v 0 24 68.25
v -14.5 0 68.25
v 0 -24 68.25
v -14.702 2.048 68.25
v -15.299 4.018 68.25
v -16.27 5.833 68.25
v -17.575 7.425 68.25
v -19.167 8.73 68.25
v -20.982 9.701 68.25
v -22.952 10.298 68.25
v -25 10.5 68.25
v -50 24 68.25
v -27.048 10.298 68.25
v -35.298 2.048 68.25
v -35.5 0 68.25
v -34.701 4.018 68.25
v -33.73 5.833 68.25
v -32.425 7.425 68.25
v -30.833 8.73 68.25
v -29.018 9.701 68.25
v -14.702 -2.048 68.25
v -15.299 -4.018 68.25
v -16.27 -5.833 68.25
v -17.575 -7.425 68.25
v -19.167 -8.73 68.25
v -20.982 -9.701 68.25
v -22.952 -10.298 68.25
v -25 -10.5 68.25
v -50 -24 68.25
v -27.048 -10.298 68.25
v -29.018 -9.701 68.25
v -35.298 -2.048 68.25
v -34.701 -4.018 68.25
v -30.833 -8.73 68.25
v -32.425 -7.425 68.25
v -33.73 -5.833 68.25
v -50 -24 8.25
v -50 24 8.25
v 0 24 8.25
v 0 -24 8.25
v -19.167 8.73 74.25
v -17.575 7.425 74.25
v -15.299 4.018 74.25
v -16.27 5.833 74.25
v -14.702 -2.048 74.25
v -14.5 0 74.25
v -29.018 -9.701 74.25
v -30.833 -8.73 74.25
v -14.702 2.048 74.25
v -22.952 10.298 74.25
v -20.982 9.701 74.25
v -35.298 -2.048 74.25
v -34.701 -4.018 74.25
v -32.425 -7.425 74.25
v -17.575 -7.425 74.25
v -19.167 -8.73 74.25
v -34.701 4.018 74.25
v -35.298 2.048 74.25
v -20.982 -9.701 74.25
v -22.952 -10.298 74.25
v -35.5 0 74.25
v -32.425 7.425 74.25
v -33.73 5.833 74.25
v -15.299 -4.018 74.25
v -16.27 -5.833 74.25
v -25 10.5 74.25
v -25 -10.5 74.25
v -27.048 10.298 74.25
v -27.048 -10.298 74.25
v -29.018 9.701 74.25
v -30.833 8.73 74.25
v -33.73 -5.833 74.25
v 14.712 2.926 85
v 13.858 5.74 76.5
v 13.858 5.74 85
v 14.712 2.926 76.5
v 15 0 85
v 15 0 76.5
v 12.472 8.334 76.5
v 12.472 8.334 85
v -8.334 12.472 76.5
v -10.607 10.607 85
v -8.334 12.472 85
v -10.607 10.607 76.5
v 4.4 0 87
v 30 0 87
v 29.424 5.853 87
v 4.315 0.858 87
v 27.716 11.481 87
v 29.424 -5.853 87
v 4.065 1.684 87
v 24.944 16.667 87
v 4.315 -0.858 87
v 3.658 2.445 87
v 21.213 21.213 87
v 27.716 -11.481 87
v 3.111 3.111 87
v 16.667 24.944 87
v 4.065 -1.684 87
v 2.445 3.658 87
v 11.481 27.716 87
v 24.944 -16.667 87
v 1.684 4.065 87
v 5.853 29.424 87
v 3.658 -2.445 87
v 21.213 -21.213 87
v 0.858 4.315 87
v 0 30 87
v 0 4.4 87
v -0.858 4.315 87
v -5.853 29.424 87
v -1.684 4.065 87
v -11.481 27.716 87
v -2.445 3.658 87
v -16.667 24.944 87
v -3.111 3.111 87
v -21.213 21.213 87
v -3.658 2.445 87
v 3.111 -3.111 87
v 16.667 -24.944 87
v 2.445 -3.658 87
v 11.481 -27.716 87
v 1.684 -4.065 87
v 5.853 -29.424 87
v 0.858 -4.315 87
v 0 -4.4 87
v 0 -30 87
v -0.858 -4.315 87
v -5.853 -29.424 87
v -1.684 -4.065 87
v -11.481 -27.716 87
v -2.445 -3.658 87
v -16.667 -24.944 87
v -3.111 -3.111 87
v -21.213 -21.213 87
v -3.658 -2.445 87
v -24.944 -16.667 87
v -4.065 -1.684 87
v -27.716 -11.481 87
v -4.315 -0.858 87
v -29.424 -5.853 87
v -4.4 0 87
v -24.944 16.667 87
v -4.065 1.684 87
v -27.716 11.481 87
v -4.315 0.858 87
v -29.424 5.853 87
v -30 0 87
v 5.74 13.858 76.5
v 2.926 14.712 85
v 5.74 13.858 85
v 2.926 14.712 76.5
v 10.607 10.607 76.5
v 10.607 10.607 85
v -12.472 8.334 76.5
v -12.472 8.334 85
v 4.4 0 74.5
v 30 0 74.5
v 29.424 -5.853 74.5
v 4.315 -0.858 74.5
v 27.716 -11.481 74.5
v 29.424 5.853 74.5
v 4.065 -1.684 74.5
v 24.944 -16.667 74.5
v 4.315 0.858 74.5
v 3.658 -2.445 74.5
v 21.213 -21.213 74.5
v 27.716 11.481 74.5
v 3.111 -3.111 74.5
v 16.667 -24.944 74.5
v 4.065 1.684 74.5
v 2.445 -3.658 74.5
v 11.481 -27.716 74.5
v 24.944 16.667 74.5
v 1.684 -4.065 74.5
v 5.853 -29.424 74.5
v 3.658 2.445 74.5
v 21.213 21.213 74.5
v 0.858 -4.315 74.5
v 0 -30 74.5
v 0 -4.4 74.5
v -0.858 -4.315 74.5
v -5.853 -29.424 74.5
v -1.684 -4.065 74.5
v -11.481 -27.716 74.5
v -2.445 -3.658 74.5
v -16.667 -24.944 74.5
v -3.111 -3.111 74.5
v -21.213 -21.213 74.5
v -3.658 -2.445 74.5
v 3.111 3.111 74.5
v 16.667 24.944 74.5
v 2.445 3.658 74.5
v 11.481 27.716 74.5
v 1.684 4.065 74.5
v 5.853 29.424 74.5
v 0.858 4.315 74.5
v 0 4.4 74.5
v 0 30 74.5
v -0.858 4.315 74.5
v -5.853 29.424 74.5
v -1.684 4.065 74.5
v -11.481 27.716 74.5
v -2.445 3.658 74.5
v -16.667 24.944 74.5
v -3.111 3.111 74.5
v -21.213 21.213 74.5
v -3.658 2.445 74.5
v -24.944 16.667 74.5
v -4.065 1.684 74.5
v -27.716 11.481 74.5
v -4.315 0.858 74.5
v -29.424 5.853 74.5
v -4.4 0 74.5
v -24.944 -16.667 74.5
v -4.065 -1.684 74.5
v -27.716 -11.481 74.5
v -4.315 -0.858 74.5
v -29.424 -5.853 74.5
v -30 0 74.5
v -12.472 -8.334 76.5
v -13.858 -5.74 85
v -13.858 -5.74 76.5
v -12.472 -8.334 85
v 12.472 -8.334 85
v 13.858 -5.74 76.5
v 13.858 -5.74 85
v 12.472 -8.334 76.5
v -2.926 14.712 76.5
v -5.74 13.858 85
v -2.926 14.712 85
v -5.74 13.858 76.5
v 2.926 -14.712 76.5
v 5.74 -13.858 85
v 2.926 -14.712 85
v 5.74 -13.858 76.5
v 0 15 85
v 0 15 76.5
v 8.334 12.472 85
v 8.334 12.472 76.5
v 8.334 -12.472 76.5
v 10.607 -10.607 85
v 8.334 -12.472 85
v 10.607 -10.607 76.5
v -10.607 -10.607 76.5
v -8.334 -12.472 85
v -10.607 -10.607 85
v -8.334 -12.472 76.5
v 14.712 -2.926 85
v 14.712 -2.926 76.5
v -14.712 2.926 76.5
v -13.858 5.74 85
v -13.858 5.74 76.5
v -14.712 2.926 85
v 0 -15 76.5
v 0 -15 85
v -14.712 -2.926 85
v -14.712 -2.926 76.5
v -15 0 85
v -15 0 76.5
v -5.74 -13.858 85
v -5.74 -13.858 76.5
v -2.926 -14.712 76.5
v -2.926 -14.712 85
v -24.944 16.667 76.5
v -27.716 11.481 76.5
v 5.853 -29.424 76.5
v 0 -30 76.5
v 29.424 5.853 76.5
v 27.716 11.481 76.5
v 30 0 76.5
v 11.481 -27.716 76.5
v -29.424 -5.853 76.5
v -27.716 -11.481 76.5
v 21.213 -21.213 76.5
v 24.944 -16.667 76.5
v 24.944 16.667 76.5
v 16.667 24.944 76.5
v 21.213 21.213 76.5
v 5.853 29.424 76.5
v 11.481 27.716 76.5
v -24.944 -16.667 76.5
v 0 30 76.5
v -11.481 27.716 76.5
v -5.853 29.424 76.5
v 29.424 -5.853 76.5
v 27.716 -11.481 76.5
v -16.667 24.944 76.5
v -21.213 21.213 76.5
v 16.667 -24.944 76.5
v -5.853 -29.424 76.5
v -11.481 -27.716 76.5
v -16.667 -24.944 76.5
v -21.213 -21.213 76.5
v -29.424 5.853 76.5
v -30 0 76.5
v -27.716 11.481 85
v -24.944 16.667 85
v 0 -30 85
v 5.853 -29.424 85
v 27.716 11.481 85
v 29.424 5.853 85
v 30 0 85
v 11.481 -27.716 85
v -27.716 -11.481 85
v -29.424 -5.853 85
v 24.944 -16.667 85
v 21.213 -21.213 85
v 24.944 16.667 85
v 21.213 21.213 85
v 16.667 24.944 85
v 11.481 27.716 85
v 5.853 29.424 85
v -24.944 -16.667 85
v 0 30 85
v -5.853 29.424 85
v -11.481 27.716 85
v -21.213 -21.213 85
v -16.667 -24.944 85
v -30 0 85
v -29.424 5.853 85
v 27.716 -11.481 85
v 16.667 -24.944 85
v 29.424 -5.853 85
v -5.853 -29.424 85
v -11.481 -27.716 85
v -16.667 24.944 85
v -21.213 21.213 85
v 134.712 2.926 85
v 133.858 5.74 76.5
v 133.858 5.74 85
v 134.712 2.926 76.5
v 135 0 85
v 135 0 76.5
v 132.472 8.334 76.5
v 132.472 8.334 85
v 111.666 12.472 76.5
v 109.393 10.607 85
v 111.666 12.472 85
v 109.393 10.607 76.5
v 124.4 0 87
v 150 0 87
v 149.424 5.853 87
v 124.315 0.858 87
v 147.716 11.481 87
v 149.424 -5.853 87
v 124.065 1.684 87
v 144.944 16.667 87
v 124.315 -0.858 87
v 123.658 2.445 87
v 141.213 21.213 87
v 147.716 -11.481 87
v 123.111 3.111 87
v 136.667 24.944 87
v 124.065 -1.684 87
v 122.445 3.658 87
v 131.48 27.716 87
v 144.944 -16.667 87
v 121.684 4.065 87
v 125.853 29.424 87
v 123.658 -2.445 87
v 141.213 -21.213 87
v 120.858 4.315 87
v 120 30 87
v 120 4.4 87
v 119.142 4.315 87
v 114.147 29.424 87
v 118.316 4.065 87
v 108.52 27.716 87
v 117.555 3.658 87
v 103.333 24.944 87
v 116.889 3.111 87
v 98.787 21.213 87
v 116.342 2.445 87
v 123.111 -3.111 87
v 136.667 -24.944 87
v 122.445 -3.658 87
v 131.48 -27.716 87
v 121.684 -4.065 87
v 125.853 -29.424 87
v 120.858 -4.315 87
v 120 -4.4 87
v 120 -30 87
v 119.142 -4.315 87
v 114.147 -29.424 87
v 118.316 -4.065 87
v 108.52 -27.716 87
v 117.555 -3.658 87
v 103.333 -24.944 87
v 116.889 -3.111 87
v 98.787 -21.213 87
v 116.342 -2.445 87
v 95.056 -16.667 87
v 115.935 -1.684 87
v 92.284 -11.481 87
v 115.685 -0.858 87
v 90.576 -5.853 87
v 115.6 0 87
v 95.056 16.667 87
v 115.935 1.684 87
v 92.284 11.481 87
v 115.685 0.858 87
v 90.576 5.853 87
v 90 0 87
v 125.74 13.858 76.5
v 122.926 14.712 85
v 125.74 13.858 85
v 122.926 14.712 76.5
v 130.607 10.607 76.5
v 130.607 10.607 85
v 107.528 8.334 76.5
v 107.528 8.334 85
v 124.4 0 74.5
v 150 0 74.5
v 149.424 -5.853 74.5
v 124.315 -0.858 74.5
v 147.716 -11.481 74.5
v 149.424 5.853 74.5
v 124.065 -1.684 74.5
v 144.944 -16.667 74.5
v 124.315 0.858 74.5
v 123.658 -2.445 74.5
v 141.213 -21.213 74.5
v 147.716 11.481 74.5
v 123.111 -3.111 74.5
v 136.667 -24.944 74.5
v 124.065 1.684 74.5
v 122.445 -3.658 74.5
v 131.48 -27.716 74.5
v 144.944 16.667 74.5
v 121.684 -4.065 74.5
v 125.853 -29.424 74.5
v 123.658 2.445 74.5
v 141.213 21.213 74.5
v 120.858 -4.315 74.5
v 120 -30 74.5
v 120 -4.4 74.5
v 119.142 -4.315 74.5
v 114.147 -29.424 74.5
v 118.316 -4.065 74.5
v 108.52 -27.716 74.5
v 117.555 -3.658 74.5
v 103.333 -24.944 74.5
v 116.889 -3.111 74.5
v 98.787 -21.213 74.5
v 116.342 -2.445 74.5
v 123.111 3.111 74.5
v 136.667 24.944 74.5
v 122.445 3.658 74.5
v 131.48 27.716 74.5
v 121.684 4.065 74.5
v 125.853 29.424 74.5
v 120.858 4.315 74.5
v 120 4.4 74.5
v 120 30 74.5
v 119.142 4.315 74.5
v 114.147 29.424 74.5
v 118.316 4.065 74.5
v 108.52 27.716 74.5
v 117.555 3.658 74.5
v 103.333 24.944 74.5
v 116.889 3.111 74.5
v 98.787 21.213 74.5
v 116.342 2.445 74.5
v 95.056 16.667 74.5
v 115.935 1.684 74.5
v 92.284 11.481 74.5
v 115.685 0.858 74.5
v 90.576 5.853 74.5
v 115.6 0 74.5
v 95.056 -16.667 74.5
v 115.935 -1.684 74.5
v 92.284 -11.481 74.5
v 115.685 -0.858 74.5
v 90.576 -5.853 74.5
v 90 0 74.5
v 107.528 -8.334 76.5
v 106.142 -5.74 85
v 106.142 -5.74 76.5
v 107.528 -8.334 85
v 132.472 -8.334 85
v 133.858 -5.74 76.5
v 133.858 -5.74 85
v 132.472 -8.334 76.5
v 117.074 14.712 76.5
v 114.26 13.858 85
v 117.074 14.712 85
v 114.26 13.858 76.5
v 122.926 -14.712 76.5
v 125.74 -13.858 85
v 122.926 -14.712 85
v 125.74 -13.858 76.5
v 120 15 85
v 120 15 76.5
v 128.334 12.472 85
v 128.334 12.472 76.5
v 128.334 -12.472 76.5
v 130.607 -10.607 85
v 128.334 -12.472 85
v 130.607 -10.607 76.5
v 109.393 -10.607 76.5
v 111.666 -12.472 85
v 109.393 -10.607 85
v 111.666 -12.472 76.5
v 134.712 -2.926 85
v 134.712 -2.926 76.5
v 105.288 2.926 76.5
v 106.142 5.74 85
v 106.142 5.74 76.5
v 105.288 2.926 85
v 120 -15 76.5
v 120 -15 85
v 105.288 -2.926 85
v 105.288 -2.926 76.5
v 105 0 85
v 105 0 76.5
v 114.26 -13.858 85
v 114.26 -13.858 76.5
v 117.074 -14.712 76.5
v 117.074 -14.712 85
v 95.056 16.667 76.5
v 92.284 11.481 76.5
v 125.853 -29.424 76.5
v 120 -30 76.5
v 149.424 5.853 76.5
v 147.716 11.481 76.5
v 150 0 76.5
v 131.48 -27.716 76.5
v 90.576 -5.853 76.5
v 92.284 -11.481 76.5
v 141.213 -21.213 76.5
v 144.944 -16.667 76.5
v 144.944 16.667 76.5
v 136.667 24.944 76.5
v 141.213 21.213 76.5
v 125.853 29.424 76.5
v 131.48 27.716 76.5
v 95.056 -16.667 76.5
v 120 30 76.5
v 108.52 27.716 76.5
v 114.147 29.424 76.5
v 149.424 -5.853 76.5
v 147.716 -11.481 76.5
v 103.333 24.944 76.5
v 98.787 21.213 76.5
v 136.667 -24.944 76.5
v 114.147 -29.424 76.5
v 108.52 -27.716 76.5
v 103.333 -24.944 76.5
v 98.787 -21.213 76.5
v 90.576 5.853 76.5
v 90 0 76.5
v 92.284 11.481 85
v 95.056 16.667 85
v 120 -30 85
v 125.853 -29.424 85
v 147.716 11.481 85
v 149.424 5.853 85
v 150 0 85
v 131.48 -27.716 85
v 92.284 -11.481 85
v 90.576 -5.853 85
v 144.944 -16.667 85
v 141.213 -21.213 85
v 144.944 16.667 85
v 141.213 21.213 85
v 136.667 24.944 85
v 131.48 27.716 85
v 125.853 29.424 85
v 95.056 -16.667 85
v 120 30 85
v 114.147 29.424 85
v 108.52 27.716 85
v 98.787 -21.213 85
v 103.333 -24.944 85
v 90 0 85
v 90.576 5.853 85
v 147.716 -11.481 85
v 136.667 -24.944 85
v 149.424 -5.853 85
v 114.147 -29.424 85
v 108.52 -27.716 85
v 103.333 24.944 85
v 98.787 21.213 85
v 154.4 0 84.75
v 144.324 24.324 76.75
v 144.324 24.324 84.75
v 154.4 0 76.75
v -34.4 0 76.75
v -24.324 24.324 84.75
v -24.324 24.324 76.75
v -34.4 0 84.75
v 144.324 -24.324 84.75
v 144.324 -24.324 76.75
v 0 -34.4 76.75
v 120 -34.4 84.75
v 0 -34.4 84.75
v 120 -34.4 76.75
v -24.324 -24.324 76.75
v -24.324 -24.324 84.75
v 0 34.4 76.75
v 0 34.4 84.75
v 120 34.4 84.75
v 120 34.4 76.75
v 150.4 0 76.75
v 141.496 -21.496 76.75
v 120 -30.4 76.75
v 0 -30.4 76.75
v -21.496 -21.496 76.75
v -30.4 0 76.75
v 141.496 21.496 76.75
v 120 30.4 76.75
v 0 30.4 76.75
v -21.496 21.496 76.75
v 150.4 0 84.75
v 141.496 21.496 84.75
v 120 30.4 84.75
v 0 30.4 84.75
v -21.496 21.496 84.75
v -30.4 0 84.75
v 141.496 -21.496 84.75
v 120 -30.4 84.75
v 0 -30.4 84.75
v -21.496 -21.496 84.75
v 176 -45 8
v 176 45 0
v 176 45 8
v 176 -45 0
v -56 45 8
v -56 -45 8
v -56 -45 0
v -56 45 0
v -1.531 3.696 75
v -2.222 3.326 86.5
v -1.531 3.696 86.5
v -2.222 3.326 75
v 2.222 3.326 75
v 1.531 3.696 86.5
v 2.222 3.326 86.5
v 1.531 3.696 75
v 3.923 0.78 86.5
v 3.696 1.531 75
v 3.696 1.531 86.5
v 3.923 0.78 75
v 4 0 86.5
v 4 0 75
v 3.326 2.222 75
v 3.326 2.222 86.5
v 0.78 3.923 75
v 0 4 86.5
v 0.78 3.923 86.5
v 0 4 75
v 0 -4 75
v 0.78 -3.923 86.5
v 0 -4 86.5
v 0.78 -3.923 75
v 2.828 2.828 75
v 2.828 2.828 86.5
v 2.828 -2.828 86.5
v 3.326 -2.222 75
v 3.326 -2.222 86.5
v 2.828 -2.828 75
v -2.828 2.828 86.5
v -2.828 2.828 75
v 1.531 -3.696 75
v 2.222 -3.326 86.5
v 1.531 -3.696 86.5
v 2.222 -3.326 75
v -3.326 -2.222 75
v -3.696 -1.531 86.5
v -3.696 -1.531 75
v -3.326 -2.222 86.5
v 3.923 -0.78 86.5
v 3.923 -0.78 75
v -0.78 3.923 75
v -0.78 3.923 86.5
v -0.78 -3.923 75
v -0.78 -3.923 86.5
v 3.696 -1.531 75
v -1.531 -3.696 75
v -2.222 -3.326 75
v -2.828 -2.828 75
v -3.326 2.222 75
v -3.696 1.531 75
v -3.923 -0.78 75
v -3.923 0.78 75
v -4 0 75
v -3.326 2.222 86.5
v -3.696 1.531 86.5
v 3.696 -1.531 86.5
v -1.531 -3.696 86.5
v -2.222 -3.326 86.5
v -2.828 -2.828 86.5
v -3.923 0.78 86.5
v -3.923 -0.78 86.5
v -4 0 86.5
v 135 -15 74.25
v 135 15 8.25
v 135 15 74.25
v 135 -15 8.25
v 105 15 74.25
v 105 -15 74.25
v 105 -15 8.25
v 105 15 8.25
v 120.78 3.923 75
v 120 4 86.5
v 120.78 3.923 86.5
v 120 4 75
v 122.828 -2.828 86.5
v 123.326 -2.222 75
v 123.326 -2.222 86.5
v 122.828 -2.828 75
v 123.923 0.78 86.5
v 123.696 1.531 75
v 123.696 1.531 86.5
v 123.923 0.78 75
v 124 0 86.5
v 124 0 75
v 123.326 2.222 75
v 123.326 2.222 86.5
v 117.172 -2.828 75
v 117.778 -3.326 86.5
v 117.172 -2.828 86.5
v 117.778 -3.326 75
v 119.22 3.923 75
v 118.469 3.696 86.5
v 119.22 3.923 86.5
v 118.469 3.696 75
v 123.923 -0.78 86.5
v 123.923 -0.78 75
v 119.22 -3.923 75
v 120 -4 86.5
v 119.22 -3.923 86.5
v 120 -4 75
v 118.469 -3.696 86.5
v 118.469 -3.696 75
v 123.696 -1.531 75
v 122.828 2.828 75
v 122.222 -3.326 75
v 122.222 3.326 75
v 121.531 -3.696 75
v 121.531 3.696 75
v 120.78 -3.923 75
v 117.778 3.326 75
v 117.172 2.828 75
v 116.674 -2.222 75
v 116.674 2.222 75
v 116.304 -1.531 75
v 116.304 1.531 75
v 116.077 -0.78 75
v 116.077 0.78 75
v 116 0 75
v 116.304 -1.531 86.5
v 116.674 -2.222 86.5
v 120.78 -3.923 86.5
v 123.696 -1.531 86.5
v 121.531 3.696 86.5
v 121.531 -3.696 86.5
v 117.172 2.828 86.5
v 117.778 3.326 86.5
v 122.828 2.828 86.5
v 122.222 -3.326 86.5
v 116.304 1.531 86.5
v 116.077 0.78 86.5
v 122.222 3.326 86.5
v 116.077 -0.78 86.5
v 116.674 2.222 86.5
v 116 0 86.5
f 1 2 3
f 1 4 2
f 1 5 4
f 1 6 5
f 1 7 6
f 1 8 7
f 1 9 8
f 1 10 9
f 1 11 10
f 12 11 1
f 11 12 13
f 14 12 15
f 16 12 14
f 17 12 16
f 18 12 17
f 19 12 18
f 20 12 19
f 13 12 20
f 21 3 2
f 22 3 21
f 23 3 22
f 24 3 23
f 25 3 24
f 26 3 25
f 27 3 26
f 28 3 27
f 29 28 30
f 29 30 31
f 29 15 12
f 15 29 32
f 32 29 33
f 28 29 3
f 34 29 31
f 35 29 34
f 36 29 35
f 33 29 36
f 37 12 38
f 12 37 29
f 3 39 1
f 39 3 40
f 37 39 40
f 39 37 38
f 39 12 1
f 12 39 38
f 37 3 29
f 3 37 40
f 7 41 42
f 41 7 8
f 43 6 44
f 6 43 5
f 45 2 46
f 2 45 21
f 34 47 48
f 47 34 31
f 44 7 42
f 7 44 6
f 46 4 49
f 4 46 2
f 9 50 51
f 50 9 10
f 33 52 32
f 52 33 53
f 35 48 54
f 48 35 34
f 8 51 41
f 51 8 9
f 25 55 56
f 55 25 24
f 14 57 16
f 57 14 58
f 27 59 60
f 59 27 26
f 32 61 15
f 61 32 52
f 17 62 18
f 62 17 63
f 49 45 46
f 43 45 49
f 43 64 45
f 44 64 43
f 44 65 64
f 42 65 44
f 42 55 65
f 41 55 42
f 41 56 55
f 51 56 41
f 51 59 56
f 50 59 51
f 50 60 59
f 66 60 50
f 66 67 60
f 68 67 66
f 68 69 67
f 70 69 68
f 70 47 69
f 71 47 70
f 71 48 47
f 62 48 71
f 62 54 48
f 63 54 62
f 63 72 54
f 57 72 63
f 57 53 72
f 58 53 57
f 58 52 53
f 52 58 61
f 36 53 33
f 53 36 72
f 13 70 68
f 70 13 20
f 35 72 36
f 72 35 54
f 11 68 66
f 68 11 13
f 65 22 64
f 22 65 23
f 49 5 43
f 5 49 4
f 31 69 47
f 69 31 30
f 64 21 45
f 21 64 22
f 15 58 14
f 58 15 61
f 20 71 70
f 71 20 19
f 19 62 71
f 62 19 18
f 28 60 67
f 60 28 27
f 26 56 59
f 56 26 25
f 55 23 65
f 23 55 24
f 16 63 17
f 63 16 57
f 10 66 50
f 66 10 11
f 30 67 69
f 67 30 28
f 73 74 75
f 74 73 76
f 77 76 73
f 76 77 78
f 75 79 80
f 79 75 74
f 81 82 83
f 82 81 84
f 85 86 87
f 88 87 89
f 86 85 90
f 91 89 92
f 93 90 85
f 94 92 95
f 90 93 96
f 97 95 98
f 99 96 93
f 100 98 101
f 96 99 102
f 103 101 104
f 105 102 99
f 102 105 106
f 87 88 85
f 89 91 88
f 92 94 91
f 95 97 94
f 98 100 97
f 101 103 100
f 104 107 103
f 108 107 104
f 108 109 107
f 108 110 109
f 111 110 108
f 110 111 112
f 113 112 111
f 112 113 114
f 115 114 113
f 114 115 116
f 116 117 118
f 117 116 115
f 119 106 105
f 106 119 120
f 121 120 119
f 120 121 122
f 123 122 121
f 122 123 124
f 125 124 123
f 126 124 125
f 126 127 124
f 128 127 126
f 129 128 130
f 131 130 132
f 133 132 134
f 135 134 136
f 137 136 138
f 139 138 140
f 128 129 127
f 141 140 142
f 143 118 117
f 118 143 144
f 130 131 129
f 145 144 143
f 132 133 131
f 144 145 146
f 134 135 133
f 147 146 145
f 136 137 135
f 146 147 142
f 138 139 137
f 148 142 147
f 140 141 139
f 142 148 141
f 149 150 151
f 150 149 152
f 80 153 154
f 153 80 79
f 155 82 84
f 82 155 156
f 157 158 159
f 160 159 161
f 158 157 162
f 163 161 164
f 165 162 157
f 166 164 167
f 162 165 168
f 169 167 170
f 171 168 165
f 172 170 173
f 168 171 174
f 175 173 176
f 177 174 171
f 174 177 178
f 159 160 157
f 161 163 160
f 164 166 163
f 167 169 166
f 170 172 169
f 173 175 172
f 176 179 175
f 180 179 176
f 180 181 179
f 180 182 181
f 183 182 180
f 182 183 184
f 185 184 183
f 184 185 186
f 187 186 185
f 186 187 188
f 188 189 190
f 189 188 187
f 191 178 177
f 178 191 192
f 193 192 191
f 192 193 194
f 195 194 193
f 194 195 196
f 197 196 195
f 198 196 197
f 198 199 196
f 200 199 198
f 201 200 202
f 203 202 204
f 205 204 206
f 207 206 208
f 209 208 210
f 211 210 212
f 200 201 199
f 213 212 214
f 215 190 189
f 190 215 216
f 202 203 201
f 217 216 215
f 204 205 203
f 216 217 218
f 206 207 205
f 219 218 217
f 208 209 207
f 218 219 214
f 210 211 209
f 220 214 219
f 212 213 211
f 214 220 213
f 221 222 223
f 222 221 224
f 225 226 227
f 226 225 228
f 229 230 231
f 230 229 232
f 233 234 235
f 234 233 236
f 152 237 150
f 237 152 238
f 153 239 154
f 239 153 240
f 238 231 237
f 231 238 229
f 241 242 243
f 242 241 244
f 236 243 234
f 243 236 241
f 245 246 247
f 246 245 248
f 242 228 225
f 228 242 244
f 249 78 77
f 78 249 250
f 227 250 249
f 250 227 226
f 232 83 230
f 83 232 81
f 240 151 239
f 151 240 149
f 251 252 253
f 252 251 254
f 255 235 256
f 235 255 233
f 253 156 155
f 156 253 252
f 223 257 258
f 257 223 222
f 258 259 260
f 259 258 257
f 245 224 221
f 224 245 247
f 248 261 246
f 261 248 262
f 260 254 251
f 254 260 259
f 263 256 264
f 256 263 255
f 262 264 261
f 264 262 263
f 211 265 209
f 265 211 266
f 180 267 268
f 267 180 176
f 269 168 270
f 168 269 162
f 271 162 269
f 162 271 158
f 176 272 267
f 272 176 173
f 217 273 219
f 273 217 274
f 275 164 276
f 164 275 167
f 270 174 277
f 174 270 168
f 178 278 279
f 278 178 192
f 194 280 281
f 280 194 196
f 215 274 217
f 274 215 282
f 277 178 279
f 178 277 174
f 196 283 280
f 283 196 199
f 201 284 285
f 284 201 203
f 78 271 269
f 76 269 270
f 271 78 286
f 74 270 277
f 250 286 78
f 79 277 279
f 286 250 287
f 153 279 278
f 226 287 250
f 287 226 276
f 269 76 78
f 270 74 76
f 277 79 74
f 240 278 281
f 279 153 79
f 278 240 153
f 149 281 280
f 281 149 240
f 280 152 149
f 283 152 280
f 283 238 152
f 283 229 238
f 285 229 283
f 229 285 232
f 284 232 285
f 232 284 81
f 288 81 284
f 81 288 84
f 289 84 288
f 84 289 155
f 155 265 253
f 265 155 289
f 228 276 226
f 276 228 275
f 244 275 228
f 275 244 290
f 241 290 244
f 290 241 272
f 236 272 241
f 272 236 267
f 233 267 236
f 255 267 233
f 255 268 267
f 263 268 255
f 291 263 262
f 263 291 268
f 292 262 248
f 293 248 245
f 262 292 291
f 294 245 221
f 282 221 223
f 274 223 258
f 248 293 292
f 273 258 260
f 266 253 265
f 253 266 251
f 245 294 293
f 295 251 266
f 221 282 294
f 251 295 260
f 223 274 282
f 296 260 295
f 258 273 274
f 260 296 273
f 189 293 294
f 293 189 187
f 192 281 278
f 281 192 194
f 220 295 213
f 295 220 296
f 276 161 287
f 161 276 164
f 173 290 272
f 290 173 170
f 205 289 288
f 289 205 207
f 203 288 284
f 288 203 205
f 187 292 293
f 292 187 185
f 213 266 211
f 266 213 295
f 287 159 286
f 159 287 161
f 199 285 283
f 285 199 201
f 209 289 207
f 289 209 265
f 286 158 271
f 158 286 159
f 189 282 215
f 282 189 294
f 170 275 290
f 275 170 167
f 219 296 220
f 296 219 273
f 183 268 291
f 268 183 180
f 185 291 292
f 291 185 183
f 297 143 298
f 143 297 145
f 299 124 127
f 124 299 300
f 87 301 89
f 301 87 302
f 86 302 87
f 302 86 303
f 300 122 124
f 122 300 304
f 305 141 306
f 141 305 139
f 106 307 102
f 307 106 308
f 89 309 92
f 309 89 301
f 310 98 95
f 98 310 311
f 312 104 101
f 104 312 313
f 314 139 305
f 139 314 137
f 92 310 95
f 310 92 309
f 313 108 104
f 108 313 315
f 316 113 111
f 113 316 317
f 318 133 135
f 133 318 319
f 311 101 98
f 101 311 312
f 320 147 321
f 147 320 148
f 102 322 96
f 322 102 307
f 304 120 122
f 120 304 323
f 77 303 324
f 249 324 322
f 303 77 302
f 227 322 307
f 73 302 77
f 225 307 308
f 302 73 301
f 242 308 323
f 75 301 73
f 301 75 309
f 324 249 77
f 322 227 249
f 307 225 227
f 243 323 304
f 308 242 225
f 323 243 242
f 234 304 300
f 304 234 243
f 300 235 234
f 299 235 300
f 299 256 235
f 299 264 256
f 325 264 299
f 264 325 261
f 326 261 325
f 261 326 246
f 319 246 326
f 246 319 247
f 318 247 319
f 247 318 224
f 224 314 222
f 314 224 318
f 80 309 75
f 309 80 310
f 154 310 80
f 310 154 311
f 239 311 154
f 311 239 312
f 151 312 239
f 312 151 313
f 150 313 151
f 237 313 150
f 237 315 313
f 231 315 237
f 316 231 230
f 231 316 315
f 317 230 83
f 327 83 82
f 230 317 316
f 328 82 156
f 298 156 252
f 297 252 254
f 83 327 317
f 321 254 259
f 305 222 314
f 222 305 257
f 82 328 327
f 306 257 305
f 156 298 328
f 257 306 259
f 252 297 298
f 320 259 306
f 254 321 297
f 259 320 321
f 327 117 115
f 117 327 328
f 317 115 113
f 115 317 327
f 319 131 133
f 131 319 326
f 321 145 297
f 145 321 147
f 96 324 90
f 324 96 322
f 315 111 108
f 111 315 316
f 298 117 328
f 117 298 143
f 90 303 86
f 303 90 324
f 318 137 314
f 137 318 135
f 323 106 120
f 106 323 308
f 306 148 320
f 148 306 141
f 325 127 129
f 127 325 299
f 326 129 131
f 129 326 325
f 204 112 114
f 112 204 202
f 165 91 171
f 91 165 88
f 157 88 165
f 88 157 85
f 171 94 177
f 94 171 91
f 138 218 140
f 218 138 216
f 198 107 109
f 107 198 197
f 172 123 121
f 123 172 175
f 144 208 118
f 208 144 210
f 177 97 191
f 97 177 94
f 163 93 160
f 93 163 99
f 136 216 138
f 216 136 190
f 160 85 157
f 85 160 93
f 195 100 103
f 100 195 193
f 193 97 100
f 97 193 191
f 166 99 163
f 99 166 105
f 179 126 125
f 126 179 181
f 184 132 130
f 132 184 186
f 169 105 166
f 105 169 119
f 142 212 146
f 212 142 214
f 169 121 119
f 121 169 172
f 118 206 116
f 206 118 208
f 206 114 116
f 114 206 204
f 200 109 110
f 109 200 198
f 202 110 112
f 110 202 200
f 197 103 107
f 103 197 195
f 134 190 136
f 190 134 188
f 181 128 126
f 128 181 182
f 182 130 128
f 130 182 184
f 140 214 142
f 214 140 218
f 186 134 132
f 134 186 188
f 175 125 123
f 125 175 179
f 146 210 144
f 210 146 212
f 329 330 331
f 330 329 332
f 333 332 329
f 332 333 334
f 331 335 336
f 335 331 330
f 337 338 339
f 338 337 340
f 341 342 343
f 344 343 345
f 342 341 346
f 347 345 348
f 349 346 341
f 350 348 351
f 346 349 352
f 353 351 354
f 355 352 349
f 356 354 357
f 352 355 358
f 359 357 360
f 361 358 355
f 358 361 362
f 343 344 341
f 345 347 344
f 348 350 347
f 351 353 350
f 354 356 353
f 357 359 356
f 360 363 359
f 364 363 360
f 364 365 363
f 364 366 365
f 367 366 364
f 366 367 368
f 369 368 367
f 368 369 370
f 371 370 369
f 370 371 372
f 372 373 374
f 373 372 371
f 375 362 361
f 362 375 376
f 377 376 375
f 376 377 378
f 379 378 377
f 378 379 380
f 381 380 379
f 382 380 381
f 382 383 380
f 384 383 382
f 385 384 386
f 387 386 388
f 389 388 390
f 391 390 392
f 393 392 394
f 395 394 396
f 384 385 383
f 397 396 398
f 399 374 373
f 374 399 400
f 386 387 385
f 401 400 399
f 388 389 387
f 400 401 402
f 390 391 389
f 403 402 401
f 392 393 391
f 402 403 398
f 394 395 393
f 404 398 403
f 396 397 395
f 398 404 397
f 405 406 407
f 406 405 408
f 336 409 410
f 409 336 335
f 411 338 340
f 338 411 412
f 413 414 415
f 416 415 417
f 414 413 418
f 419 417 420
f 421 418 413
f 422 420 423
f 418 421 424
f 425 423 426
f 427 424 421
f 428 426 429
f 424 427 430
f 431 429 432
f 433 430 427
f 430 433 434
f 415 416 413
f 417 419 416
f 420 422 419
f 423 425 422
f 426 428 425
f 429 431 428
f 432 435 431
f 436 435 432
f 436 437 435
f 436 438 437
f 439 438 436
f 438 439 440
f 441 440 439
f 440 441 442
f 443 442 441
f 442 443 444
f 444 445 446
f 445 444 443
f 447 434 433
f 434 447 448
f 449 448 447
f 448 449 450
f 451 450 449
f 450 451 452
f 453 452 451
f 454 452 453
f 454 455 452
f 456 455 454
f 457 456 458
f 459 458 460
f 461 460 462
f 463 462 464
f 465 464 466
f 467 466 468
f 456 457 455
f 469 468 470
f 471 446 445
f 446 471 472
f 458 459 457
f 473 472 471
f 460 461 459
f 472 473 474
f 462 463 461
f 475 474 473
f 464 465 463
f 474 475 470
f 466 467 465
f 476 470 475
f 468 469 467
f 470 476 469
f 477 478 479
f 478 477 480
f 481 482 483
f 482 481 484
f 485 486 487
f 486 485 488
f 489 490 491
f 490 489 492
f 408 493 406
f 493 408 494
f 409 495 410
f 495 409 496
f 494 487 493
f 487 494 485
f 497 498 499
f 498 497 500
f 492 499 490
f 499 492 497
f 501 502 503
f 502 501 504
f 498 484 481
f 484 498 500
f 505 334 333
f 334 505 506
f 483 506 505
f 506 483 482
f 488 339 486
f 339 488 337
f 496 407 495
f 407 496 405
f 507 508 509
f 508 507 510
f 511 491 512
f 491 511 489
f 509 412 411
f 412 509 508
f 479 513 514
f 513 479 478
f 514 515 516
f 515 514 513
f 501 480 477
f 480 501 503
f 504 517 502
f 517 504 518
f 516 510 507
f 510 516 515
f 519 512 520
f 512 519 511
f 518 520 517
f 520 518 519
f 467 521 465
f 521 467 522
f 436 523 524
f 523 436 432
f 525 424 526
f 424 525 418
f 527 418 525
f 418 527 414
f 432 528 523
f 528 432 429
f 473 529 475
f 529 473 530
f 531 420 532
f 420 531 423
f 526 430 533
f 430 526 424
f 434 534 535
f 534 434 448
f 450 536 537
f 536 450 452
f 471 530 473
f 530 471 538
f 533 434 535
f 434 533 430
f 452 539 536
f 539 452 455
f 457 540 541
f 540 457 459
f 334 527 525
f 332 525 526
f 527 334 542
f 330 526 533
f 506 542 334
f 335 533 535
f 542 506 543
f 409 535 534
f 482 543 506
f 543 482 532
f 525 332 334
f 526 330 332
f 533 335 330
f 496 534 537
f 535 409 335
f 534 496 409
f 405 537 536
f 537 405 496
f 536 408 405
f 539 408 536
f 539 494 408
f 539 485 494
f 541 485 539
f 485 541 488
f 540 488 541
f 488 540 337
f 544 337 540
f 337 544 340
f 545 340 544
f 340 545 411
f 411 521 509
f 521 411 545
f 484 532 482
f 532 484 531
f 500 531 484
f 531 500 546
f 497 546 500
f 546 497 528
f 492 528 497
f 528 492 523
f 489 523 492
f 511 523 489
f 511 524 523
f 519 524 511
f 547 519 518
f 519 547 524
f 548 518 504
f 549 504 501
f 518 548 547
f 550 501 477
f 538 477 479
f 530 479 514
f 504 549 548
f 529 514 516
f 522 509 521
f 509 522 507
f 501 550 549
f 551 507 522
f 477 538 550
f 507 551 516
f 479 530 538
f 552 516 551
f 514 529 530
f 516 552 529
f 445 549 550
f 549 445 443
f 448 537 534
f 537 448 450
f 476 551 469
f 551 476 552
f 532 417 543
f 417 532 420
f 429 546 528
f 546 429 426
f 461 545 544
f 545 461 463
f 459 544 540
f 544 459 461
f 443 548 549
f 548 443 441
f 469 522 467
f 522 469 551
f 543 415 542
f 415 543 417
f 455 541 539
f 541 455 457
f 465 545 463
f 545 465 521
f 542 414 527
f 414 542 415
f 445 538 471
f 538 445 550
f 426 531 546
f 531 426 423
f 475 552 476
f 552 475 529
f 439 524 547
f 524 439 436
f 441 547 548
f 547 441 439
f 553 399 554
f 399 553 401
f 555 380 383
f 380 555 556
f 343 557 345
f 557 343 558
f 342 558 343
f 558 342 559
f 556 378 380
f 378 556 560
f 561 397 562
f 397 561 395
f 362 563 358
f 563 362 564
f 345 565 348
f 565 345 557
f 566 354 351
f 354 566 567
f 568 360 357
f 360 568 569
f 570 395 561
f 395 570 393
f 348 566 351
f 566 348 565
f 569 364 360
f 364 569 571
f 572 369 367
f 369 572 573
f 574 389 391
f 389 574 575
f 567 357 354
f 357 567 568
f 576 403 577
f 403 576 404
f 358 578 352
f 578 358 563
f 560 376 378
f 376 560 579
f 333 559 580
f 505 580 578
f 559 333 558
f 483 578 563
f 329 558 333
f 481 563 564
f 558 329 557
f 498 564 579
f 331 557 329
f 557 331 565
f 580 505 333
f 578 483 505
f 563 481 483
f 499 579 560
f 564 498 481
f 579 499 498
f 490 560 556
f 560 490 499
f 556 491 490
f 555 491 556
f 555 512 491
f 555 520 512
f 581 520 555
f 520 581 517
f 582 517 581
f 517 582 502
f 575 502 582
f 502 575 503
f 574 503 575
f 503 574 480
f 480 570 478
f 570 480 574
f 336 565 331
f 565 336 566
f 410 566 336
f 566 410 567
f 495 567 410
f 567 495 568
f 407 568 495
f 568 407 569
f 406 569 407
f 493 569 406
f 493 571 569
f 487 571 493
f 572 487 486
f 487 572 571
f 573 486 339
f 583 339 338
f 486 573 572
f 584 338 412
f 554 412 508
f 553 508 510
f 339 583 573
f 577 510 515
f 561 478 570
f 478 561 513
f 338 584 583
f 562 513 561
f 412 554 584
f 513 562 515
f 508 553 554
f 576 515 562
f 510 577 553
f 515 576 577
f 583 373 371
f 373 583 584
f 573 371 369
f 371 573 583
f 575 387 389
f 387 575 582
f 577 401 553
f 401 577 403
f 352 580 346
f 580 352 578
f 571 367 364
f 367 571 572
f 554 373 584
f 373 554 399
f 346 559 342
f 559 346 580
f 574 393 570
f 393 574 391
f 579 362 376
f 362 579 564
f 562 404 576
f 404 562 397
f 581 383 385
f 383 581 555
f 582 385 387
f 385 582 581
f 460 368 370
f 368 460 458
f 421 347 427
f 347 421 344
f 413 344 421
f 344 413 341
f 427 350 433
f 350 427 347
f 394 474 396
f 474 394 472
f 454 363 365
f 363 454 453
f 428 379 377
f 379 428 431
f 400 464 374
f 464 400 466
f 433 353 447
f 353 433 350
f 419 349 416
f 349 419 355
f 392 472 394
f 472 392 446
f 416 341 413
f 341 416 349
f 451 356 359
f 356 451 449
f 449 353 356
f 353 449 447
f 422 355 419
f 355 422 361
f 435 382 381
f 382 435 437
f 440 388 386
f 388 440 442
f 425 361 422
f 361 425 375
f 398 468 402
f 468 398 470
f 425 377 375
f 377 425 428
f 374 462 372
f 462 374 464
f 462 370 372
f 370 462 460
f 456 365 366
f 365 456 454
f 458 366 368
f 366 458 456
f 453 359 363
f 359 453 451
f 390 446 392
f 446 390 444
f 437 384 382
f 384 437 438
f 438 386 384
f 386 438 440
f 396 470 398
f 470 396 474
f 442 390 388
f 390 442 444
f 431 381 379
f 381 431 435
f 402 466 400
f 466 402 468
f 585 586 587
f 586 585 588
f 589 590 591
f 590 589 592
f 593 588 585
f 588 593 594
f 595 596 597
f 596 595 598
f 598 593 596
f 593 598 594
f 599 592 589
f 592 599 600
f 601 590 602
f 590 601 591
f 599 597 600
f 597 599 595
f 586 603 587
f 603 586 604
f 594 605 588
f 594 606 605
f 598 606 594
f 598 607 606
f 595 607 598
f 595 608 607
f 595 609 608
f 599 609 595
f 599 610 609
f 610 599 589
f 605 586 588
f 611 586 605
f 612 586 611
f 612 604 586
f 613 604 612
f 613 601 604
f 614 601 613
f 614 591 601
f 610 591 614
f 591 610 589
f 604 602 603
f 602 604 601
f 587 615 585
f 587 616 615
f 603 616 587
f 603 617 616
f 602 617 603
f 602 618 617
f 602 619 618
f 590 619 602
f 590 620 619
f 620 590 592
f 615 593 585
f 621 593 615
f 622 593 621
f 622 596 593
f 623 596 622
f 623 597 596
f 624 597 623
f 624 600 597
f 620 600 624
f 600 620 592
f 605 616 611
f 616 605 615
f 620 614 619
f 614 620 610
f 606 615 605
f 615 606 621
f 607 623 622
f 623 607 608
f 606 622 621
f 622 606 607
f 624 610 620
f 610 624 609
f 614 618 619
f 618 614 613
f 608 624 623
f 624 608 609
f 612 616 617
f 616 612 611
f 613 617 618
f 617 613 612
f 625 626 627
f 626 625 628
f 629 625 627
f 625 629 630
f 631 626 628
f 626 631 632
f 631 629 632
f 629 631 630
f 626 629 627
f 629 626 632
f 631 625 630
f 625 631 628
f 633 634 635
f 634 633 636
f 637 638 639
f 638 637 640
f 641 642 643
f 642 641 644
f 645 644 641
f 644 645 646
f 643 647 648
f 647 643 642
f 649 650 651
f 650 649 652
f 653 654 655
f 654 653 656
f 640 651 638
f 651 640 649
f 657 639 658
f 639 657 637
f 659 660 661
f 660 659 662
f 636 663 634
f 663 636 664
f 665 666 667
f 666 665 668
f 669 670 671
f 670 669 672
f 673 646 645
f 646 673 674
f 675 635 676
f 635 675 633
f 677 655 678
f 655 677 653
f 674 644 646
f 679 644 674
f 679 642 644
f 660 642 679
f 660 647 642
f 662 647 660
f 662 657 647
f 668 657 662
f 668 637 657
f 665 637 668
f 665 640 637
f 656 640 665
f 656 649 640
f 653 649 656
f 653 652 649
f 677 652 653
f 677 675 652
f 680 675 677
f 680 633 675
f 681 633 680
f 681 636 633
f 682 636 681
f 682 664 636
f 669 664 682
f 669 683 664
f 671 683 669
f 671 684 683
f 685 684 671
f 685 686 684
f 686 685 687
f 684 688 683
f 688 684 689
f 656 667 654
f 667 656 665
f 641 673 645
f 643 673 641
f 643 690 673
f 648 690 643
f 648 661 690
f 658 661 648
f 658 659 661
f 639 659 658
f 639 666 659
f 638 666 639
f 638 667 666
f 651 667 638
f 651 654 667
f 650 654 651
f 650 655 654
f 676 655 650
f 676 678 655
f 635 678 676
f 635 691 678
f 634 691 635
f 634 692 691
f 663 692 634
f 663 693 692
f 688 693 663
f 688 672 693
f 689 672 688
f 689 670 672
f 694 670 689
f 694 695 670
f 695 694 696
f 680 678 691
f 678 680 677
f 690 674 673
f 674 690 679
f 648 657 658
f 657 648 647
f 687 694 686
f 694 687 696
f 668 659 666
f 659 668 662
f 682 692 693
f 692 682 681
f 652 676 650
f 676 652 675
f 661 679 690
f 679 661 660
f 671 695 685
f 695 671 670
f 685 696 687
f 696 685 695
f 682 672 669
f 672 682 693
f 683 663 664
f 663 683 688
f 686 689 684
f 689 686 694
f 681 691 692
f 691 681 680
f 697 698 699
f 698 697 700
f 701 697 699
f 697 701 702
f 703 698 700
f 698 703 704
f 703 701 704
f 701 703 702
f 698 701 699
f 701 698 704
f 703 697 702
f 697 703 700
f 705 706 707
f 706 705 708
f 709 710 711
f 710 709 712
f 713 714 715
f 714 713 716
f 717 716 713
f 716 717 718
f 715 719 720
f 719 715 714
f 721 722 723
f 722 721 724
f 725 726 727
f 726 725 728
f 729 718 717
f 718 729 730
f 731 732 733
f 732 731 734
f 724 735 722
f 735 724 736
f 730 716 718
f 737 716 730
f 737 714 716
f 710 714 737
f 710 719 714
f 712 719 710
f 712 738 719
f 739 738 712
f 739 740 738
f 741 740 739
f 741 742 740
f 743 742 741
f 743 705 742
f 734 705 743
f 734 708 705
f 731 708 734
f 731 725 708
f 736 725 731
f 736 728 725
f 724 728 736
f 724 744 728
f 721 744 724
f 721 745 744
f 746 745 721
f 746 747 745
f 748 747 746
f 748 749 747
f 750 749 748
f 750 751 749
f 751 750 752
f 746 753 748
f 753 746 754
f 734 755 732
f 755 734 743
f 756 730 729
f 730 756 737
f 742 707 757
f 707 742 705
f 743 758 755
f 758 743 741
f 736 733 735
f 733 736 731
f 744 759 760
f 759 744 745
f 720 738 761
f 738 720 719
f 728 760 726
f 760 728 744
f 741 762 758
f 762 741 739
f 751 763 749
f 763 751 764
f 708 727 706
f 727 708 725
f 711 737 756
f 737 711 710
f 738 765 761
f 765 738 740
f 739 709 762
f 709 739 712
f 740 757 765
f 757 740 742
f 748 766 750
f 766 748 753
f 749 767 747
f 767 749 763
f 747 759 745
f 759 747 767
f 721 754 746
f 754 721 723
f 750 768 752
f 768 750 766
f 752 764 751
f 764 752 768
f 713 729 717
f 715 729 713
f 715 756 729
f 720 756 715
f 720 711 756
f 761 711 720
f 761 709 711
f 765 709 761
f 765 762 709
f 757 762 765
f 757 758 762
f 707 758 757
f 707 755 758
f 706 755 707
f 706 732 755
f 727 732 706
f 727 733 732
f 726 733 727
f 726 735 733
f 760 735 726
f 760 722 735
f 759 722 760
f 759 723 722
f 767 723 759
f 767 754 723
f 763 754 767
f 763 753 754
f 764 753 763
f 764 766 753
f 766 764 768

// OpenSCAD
$fn = 32;

// ------------------------------------------------------------------------
// Motor belt drive: span 120 mm, pulleys d60, belt 8 mm wide
// Every part is its own module, assembly() places every instance.
// ------------------------------------------------------------------------

// --- part 1 ---
module base_plate() {
  difference() {
    translate([-116, -45, 0]) cube([232, 90, 8]);
  }
}

// --- part 2 ---
module motor() {
  union() {
    translate([-30, -24, 0]) cube([60, 48, 50]);
    translate([33, 0, 25]) rotate([0, 90, 0]) cylinder(h = 6, d = 21, center = true);
  }
}

// --- part 3 ---
module drive_shaft() {
  translate([0, 0, -5.75]) cylinder(h = 11.5, d = 8);
}

// --- part 4 ---
module pulley_drive() {
  difference() {
    union() {
      cylinder(h = 12.5, d = 30);
      cylinder(h = 2, d = 60);
      translate([0, 0, 10.5]) cylinder(h = 2, d = 60);
    }
    translate([0, 0, -1]) cylinder(h = 14.5, d = 8.8);
  }
}

// --- part 5 ---
module idler_post() {
  translate([-15, -15, 0]) cube([30, 30, 66]);
}

// --- part 6 ---
module driven_shaft() {
  translate([0, 0, -5.75]) cylinder(h = 11.5, d = 8);
}

// --- part 7 ---
module pulley_driven() {
  difference() {
    union() {
      cylinder(h = 12.5, d = 30);
      cylinder(h = 2, d = 60);
      translate([0, 0, 10.5]) cylinder(h = 2, d = 60);
    }
    translate([0, 0, -1]) cylinder(h = 14.5, d = 8.8);
  }
}

// --- part 8 ---
module drive_belt() {
  difference() {
    linear_extrude(height = 8) polygon(points = concat([for (a = [90 : 45 : 270]) [34.4 * cos(a), 34.4 * sin(a)]], [for (a = [270 : 45 : 450]) [120 + 34.4 * cos(a), 34.4 * sin(a)]]));
    translate([0, 0, -1]) linear_extrude(height = 10) polygon(points = concat([for (a = [90 : 45 : 270]) [30.4 * cos(a), 30.4 * sin(a)]], [for (a = [270 : 45 : 450]) [120 + 30.4 * cos(a), 30.4 * sin(a)]]));
  }
}

// --- assembly ---
module assembly() {
  color([0.80, 0.24, 0.20]) translate([60, 0, 0]) rotate([0, 0, 0]) base_plate();
  color([0.20, 0.45, 0.75]) translate([0, 0, 38.25]) rotate([0, 270, 0]) motor();
  color([0.25, 0.62, 0.32]) translate([0, 0, 80.75]) rotate([0, 0, 0]) drive_shaft();
  color([0.92, 0.70, 0.18]) translate([0, 0, 74.5]) rotate([0, 0, 0]) pulley_drive();
  color([0.58, 0.35, 0.70]) translate([120, 0, 8.25]) rotate([0, 0, 0]) idler_post();
  color([0.16, 0.66, 0.66]) translate([120, 0, 80.75]) rotate([0, 0, 0]) driven_shaft();
  color([0.85, 0.48, 0.18]) translate([120, 0, 74.5]) rotate([0, 0, 0]) pulley_driven();
  color([0.55, 0.60, 0.65]) translate([0, 0, 76.75]) rotate([0, 0, 0]) drive_belt();
}

assembly();
